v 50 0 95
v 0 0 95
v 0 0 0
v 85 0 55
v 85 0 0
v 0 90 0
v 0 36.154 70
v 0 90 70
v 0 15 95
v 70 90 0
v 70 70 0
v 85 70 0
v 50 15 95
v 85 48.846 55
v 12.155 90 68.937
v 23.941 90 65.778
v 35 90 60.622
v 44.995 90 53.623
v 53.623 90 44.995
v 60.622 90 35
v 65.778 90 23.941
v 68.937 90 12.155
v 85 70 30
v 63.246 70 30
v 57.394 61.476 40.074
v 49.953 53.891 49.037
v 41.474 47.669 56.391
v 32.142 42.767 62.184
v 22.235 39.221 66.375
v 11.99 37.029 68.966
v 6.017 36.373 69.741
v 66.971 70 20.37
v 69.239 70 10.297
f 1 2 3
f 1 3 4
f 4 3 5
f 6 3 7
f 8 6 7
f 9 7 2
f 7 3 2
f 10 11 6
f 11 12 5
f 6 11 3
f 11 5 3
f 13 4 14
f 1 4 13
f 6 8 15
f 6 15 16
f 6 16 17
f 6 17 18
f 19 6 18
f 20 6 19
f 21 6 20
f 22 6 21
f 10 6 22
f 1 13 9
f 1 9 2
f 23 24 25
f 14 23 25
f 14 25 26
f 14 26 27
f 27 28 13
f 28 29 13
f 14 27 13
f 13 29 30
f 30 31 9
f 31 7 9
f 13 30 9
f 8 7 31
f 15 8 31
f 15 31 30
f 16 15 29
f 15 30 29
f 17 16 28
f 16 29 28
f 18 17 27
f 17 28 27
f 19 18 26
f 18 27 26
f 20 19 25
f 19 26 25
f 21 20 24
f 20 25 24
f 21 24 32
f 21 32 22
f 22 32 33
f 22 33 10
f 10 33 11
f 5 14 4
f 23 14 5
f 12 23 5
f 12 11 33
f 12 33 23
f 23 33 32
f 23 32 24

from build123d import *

# Parameters (mm, degrees)
EXTRUDE1_DEPTH = 90
EXTRUDE2_DEPTH = 85
EXTRUDE3_DEPTH = 91


with BuildPart() as part:
    # Sketch1 → Extrude1 (new body)
    with BuildSketch(Plane(origin=(0, 0, 0), x_dir=(1, 0, 0), z_dir=(0, 1, 0))):
        with BuildLine():
            Line((70, 0), (0, 0))
            Line((0, 0), (0, -70))
            ThreePointArc((0, -70), (49.497474683, -49.497474683), (70, 0))
        make_face()
    extrude(amount=EXTRUDE1_DEPTH)

    # Sketch2 → Extrude2 (add)
    with BuildSketch(Plane.ZY):
        Polygon((0, 70), (30, 70), (95, 15), (95, 0), (0, 0), align=None)
    extrude(amount=-EXTRUDE2_DEPTH)

    # Sketch3 → Extrude3 (cut, through all)
    with BuildSketch(Plane(origin=(0, 0, 0), x_dir=(1, 0, 0), z_dir=(0, 1, 0))):
        Polygon((85, -55), (50, -95), (85, -95), align=None)
    extrude(amount=EXTRUDE3_DEPTH, mode=Mode.SUBTRACT)


solid = part.part
